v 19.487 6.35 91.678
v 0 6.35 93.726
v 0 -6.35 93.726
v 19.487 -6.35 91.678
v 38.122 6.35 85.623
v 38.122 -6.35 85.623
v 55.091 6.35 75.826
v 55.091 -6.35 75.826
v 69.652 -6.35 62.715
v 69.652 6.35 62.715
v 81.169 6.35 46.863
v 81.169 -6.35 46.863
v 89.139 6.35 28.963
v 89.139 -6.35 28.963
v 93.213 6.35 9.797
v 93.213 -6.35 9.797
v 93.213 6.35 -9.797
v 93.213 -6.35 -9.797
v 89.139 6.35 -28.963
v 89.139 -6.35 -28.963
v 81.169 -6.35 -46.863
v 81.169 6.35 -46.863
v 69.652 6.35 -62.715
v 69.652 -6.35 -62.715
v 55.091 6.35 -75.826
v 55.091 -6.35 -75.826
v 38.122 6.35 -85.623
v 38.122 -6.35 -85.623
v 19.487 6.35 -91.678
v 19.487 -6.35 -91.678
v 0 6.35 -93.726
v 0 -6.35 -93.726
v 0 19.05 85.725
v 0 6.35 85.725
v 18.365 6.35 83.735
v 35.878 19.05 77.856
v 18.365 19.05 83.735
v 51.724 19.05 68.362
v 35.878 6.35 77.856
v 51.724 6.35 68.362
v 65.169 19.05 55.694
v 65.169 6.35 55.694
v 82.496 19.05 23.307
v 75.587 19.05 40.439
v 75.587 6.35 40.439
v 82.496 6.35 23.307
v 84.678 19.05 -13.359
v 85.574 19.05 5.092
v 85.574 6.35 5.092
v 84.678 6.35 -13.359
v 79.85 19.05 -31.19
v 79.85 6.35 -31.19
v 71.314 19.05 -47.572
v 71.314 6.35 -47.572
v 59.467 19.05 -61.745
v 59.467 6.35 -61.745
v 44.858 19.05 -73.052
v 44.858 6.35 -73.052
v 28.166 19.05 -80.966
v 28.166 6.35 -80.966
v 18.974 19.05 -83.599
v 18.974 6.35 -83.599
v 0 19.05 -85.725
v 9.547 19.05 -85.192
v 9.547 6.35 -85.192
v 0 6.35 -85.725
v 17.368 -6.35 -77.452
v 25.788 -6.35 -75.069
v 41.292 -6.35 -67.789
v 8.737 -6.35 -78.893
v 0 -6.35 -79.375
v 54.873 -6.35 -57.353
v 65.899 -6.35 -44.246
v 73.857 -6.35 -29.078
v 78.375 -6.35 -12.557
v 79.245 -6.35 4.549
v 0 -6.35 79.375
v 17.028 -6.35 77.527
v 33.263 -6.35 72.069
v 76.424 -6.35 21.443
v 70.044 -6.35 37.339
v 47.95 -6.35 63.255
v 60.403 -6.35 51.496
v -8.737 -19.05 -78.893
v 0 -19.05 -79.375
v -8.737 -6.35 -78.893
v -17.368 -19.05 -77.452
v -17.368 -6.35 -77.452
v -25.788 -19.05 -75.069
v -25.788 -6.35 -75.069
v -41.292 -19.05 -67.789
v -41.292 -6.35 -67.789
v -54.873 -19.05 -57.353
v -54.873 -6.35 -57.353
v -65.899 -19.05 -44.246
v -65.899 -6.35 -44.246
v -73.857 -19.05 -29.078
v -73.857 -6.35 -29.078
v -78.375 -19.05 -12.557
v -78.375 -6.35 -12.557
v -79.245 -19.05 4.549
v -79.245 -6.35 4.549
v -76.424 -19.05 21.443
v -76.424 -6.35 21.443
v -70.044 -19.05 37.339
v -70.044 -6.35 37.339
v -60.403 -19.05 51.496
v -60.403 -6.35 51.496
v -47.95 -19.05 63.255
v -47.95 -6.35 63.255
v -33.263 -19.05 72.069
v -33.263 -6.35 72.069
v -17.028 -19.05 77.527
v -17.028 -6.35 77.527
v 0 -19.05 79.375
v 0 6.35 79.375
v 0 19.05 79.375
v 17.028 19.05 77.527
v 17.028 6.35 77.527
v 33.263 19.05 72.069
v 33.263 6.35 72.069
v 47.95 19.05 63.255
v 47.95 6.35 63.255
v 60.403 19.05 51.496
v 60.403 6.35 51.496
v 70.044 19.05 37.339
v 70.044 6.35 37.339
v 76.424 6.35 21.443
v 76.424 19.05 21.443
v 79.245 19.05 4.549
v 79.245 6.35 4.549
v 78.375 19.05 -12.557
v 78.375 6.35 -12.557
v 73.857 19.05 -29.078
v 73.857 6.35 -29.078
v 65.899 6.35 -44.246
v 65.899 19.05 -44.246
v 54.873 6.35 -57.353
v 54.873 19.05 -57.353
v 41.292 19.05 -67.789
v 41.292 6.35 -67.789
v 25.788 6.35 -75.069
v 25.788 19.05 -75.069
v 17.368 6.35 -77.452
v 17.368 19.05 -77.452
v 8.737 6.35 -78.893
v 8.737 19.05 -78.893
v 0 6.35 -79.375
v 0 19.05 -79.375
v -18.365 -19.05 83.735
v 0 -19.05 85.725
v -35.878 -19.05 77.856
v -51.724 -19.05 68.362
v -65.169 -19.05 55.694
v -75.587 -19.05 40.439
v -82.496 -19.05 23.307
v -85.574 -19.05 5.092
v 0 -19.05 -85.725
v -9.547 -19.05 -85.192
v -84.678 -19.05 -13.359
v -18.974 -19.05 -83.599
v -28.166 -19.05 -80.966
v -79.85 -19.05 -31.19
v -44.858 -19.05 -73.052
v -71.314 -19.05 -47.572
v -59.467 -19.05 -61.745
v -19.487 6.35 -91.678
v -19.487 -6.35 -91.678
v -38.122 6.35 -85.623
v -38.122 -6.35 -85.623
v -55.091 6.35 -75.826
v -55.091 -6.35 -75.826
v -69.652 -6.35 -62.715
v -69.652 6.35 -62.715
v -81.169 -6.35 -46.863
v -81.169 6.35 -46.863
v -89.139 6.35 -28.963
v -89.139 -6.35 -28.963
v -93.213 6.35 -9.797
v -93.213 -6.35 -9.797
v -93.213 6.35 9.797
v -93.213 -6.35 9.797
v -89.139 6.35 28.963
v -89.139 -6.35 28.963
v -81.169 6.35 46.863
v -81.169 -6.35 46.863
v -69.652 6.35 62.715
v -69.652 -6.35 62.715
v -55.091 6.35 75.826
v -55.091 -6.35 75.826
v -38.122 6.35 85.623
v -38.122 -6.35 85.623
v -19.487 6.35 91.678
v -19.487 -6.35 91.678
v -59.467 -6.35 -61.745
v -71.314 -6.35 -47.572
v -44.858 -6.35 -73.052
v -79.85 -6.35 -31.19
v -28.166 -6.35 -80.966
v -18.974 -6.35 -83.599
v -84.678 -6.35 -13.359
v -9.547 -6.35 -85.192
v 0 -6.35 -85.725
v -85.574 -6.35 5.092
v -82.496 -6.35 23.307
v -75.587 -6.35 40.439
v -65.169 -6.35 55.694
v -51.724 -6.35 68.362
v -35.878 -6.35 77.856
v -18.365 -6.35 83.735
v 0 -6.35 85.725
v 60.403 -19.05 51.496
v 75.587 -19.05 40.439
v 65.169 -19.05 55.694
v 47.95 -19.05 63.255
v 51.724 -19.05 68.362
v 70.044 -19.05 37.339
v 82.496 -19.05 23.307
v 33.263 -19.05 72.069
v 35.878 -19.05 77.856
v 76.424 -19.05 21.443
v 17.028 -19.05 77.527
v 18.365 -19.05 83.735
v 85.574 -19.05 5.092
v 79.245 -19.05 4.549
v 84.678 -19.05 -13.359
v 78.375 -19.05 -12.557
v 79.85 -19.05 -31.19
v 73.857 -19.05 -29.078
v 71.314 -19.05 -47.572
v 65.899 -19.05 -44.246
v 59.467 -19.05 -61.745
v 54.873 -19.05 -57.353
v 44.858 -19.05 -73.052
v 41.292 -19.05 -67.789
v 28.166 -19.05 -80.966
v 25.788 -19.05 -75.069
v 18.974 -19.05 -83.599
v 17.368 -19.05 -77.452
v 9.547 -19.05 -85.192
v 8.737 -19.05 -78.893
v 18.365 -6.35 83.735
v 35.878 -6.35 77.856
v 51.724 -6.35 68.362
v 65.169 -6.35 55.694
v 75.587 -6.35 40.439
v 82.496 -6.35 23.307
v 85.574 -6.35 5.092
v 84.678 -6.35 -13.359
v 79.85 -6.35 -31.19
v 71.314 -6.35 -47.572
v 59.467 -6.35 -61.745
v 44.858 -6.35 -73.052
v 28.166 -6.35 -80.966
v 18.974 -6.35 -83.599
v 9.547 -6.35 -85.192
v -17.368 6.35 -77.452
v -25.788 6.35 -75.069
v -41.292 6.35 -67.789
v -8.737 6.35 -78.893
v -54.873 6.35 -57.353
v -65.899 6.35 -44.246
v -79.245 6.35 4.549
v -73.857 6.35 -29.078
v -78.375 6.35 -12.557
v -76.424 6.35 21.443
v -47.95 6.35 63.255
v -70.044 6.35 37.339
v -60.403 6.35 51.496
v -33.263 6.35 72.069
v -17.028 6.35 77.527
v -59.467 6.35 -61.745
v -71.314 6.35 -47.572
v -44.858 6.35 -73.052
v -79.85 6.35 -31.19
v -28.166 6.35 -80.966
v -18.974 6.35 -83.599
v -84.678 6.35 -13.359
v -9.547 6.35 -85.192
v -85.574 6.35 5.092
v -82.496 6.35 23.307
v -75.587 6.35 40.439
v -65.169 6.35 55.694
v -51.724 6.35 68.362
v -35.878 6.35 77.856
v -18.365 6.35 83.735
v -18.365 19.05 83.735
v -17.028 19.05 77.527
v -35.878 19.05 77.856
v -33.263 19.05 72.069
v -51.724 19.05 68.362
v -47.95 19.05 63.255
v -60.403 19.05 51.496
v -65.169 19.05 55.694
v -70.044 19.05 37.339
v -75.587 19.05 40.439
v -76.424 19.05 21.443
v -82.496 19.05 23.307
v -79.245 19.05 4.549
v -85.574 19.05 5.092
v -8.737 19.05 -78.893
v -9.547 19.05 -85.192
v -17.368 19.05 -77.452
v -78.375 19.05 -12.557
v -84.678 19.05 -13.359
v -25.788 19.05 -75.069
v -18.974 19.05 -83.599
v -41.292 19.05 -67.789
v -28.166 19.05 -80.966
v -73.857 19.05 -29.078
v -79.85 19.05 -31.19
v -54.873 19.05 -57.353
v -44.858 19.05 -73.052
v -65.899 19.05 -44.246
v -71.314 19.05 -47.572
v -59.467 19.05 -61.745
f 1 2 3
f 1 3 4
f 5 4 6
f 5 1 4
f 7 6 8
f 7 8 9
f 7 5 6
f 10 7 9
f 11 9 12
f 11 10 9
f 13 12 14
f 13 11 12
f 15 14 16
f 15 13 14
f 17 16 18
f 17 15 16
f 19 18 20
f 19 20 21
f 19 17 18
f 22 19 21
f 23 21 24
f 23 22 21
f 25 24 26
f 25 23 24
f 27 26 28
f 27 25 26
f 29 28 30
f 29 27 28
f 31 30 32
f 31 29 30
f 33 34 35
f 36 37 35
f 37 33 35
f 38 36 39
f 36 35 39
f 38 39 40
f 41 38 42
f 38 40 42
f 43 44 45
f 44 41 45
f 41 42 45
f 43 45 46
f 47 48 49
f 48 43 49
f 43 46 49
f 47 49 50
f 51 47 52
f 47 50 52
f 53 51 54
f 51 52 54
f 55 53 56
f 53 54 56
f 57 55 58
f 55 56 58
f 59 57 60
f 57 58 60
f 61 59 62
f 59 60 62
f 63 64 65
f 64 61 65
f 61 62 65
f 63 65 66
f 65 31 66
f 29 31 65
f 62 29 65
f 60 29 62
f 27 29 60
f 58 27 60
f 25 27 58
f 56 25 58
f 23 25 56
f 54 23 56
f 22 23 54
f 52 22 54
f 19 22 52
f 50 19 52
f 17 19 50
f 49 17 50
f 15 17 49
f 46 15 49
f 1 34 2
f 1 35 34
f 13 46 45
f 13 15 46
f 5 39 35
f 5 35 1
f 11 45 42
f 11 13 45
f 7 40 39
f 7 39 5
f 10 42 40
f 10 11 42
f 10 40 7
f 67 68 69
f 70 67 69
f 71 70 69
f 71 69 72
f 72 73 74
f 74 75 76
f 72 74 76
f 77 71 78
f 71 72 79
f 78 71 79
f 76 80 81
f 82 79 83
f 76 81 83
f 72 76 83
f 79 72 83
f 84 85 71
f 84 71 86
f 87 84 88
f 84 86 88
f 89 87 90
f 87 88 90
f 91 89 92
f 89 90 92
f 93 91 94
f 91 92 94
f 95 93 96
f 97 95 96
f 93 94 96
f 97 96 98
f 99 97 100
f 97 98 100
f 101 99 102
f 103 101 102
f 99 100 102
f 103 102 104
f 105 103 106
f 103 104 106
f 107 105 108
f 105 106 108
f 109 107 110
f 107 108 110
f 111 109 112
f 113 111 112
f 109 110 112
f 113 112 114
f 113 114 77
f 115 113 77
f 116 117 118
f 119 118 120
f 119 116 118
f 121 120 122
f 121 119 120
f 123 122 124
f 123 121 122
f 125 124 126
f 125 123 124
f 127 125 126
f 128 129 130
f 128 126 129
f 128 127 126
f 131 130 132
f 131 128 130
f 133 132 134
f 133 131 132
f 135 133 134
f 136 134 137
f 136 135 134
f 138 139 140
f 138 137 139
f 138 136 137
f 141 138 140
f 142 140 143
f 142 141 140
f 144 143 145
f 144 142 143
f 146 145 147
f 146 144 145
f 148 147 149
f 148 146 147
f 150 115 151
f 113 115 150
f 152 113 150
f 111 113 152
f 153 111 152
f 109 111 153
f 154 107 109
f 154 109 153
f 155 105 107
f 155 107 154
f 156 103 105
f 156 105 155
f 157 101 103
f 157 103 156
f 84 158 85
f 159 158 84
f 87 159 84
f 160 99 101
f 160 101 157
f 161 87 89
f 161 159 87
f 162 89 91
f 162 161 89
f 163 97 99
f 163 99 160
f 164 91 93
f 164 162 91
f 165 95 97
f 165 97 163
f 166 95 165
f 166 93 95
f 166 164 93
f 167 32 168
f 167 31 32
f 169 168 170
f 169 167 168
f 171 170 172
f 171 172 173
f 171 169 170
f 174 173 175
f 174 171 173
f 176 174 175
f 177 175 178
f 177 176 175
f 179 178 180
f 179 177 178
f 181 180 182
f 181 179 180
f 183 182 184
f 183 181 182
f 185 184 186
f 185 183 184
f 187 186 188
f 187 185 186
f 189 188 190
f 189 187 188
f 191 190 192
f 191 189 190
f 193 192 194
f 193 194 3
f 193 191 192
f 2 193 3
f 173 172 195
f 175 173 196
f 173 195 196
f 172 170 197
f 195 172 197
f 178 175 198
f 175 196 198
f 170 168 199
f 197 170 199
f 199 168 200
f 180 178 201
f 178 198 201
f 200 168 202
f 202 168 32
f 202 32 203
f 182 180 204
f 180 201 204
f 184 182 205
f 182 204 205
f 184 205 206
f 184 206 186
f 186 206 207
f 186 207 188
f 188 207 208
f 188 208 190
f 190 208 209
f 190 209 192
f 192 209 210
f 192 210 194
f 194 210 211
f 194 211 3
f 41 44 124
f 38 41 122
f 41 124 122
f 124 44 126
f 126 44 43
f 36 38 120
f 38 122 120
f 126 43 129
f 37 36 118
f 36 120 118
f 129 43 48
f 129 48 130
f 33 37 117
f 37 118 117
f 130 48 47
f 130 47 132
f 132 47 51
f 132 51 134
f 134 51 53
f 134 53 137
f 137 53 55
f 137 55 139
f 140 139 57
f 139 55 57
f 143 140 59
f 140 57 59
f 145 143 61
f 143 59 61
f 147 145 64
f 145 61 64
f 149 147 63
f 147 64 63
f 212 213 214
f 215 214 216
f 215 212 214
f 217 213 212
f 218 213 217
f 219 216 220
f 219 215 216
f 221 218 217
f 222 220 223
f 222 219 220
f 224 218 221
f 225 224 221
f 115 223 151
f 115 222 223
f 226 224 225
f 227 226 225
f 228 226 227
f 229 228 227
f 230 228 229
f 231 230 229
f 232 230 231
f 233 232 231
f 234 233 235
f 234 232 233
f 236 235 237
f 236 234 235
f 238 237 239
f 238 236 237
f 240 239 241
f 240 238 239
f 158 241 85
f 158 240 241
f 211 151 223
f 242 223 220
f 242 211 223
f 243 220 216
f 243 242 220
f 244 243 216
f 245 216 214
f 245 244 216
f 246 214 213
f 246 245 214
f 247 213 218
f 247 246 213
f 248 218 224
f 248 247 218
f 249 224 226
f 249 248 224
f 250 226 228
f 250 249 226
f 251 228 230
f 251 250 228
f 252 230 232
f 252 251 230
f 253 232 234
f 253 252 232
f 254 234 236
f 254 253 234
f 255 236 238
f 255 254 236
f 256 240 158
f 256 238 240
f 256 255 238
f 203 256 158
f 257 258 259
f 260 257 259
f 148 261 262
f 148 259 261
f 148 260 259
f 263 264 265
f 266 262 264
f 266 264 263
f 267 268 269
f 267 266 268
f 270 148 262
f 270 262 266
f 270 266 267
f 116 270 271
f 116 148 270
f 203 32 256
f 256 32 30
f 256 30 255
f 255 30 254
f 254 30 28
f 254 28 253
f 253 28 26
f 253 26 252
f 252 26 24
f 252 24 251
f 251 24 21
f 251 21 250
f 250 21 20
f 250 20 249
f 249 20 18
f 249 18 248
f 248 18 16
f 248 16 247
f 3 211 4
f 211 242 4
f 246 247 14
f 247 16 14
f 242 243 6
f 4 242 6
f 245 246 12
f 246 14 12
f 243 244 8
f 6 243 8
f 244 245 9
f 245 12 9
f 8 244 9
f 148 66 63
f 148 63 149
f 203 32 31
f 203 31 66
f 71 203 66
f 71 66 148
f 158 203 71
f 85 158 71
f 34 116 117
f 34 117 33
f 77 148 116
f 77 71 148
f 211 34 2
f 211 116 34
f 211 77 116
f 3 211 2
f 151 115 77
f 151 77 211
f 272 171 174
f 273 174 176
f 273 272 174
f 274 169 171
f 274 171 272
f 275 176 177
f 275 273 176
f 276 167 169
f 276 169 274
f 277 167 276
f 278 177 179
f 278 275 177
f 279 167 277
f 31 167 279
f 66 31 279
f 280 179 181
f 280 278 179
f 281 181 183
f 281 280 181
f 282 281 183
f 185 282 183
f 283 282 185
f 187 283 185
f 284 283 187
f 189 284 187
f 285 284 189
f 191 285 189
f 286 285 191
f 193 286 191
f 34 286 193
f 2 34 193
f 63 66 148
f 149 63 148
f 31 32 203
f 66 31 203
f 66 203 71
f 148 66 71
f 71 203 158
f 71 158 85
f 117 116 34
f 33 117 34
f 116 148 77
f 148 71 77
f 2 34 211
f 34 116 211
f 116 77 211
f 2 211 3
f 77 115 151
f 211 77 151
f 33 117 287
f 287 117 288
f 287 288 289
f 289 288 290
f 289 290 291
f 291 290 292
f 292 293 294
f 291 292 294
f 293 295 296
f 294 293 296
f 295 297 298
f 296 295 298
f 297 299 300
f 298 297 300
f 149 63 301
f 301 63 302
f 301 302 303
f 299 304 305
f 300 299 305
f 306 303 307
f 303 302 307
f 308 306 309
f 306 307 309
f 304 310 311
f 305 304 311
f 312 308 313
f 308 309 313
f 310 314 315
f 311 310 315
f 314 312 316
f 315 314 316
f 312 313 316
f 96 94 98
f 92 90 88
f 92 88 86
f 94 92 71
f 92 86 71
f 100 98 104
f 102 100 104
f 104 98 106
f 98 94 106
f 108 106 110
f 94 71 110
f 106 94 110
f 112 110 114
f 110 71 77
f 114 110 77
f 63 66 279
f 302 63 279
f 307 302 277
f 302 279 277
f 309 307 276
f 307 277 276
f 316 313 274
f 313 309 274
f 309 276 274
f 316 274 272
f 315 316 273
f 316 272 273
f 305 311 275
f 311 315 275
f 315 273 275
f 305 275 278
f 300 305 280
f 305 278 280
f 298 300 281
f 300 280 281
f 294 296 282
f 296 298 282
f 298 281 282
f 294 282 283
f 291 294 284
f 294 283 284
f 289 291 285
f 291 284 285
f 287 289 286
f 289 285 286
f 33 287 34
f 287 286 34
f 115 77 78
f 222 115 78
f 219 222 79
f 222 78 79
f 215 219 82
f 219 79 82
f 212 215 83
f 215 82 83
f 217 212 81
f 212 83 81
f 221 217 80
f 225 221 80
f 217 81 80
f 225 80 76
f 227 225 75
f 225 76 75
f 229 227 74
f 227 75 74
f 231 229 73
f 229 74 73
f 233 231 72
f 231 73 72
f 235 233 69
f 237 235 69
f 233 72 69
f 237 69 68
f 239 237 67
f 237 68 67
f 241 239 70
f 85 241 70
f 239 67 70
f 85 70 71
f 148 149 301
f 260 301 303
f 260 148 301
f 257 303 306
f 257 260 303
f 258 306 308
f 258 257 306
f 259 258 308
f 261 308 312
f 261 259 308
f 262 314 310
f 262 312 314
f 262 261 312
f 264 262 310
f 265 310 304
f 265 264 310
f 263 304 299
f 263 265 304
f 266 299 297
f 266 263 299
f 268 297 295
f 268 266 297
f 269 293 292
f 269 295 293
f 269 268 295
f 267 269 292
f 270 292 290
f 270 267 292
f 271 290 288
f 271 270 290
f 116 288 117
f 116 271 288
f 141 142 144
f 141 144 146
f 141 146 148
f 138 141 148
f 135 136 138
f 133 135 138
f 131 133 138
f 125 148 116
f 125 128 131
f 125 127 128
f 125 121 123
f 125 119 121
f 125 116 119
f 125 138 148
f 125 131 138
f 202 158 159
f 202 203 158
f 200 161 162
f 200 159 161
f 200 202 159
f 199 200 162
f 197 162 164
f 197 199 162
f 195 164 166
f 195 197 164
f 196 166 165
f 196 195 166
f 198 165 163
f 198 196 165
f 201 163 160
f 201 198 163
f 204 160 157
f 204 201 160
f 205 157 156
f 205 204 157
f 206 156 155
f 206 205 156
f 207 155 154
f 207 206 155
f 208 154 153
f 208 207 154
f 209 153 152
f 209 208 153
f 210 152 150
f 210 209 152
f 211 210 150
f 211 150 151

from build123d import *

# Parameters (mm, degrees)
SKETCH1_R            = 93.726
BOSS_EXTRUDE1_DEPTH  = 6.35
SKETCH5_R            = 85.725
SKETCH5_R_2          = 79.375
BOSS_EXTRUDE2_DEPTH  = 12.7
BOSS_EXTRUDE3_DEPTH  = 25.4
MIRROR5_COPY_1_DEPTH = 25.4
MIRROR5_COPY_2_DEPTH = 25.4


with BuildPart() as part:
    # Sketch1 → Boss-Extrude1 (new, symmetric)
    with BuildSketch(Plane(origin=(0, 0, 0), x_dir=(1, 0, 0), z_dir=(0, 1, 0))):
        with Locations(Location((0, 0, 0), (0, 0, 270))):
            Circle(SKETCH1_R)
    extrude(amount=BOSS_EXTRUDE1_DEPTH, both=True)

    # Sketch5 → Boss-Extrude2 (add)
    with BuildSketch(Plane(origin=(0, 6.35, 0), x_dir=(1, 0, 0), z_dir=(0, 1, 0))):
        with Locations(Location((0, 0, 0), (0, 0, 270))):
            Circle(SKETCH5_R)
        with Locations(Location((0, 0, 0), (0, 0, 270))):
            Circle(SKETCH5_R_2, mode=Mode.SUBTRACT)
    boss_extrude2 = extrude(amount=BOSS_EXTRUDE2_DEPTH)

    # Mirror1: Boss-Extrude2 across plane
    add(boss_extrude2.mirror(Plane.ZX))

    # Sketch7 → Boss-Extrude3 (add)
    with BuildSketch(Plane(origin=(0, 19.05, 0), x_dir=(1, 0, 0), z_dir=(0, 1, 0))):
        with BuildLine():
            Line((-25.787822327, 75.06916041), (-28.166257291, 80.965656764))
            ThreePointArc((-28.166257291, 80.965656764), (0, 85.725), (28.166257291, 80.965656764))
            Line((28.166257291, 80.965656764), (25.787822327, 75.06916041))
            ThreePointArc((25.787822327, 75.06916041), (0, 79.375), (-25.787822327, 75.06916041))
        make_face()
    boss_extrude3 = extrude(amount=-BOSS_EXTRUDE3_DEPTH)

    # Mirror3: Boss-Extrude3 across plane
    add(boss_extrude3.mirror(Plane.ZX))

    # Mirror4: Boss-Extrude3 across plane
    add(boss_extrude3.mirror(Plane.XY))

    # Mirror5 copy 1 sketch → Mirror5 copy 1 (add)
    with BuildSketch(Plane.XZ.offset(19.05)):
        with BuildLine():
            Line((-25.787822327, 75.06916041), (-28.166257291, 80.965656764))
            ThreePointArc((-28.166257291, 80.965656764), (0, 85.725), (28.166257291, 80.965656764))
            Line((28.166257291, 80.965656764), (25.787822327, 75.06916041))
            ThreePointArc((25.787822327, 75.06916041), (0, 79.375), (-25.787822327, 75.06916041))
        make_face()
    extrude(amount=-MIRROR5_COPY_1_DEPTH)

    # Mirror5 copy 2 sketch → Mirror5 copy 2 (add)
    with BuildSketch(Plane.XZ.offset(19.05)):
        with BuildLine():
            Line((-25.787822327, -75.06916041), (-28.166257291, -80.965656764))
            ThreePointArc((-28.166257291, -80.965656764), (0, -85.725), (28.166257291, -80.965656764))
            Line((28.166257291, -80.965656764), (25.787822327, -75.06916041))
            ThreePointArc((25.787822327, -75.06916041), (0, -79.375), (-25.787822327, -75.06916041))
        make_face()
    extrude(amount=-MIRROR5_COPY_2_DEPTH)


with BuildPart() as body_2:
    # Split1: the piece on the far side of the plane
    add(part.part)
    split(bisect_by=Plane(origin=(0, 0, 0), x_dir=(0, 0, 1), z_dir=(1, 0, 0)), keep=Keep.BOTTOM)


with BuildPart() as part_1:
    add(part.part)

    # Split1
    split(bisect_by=Plane(origin=(0, 0, 0), x_dir=(0, 0, 1), z_dir=(1, 0, 0)), keep=Keep.TOP)


solid = Compound([body_2.part, part_1.part])
